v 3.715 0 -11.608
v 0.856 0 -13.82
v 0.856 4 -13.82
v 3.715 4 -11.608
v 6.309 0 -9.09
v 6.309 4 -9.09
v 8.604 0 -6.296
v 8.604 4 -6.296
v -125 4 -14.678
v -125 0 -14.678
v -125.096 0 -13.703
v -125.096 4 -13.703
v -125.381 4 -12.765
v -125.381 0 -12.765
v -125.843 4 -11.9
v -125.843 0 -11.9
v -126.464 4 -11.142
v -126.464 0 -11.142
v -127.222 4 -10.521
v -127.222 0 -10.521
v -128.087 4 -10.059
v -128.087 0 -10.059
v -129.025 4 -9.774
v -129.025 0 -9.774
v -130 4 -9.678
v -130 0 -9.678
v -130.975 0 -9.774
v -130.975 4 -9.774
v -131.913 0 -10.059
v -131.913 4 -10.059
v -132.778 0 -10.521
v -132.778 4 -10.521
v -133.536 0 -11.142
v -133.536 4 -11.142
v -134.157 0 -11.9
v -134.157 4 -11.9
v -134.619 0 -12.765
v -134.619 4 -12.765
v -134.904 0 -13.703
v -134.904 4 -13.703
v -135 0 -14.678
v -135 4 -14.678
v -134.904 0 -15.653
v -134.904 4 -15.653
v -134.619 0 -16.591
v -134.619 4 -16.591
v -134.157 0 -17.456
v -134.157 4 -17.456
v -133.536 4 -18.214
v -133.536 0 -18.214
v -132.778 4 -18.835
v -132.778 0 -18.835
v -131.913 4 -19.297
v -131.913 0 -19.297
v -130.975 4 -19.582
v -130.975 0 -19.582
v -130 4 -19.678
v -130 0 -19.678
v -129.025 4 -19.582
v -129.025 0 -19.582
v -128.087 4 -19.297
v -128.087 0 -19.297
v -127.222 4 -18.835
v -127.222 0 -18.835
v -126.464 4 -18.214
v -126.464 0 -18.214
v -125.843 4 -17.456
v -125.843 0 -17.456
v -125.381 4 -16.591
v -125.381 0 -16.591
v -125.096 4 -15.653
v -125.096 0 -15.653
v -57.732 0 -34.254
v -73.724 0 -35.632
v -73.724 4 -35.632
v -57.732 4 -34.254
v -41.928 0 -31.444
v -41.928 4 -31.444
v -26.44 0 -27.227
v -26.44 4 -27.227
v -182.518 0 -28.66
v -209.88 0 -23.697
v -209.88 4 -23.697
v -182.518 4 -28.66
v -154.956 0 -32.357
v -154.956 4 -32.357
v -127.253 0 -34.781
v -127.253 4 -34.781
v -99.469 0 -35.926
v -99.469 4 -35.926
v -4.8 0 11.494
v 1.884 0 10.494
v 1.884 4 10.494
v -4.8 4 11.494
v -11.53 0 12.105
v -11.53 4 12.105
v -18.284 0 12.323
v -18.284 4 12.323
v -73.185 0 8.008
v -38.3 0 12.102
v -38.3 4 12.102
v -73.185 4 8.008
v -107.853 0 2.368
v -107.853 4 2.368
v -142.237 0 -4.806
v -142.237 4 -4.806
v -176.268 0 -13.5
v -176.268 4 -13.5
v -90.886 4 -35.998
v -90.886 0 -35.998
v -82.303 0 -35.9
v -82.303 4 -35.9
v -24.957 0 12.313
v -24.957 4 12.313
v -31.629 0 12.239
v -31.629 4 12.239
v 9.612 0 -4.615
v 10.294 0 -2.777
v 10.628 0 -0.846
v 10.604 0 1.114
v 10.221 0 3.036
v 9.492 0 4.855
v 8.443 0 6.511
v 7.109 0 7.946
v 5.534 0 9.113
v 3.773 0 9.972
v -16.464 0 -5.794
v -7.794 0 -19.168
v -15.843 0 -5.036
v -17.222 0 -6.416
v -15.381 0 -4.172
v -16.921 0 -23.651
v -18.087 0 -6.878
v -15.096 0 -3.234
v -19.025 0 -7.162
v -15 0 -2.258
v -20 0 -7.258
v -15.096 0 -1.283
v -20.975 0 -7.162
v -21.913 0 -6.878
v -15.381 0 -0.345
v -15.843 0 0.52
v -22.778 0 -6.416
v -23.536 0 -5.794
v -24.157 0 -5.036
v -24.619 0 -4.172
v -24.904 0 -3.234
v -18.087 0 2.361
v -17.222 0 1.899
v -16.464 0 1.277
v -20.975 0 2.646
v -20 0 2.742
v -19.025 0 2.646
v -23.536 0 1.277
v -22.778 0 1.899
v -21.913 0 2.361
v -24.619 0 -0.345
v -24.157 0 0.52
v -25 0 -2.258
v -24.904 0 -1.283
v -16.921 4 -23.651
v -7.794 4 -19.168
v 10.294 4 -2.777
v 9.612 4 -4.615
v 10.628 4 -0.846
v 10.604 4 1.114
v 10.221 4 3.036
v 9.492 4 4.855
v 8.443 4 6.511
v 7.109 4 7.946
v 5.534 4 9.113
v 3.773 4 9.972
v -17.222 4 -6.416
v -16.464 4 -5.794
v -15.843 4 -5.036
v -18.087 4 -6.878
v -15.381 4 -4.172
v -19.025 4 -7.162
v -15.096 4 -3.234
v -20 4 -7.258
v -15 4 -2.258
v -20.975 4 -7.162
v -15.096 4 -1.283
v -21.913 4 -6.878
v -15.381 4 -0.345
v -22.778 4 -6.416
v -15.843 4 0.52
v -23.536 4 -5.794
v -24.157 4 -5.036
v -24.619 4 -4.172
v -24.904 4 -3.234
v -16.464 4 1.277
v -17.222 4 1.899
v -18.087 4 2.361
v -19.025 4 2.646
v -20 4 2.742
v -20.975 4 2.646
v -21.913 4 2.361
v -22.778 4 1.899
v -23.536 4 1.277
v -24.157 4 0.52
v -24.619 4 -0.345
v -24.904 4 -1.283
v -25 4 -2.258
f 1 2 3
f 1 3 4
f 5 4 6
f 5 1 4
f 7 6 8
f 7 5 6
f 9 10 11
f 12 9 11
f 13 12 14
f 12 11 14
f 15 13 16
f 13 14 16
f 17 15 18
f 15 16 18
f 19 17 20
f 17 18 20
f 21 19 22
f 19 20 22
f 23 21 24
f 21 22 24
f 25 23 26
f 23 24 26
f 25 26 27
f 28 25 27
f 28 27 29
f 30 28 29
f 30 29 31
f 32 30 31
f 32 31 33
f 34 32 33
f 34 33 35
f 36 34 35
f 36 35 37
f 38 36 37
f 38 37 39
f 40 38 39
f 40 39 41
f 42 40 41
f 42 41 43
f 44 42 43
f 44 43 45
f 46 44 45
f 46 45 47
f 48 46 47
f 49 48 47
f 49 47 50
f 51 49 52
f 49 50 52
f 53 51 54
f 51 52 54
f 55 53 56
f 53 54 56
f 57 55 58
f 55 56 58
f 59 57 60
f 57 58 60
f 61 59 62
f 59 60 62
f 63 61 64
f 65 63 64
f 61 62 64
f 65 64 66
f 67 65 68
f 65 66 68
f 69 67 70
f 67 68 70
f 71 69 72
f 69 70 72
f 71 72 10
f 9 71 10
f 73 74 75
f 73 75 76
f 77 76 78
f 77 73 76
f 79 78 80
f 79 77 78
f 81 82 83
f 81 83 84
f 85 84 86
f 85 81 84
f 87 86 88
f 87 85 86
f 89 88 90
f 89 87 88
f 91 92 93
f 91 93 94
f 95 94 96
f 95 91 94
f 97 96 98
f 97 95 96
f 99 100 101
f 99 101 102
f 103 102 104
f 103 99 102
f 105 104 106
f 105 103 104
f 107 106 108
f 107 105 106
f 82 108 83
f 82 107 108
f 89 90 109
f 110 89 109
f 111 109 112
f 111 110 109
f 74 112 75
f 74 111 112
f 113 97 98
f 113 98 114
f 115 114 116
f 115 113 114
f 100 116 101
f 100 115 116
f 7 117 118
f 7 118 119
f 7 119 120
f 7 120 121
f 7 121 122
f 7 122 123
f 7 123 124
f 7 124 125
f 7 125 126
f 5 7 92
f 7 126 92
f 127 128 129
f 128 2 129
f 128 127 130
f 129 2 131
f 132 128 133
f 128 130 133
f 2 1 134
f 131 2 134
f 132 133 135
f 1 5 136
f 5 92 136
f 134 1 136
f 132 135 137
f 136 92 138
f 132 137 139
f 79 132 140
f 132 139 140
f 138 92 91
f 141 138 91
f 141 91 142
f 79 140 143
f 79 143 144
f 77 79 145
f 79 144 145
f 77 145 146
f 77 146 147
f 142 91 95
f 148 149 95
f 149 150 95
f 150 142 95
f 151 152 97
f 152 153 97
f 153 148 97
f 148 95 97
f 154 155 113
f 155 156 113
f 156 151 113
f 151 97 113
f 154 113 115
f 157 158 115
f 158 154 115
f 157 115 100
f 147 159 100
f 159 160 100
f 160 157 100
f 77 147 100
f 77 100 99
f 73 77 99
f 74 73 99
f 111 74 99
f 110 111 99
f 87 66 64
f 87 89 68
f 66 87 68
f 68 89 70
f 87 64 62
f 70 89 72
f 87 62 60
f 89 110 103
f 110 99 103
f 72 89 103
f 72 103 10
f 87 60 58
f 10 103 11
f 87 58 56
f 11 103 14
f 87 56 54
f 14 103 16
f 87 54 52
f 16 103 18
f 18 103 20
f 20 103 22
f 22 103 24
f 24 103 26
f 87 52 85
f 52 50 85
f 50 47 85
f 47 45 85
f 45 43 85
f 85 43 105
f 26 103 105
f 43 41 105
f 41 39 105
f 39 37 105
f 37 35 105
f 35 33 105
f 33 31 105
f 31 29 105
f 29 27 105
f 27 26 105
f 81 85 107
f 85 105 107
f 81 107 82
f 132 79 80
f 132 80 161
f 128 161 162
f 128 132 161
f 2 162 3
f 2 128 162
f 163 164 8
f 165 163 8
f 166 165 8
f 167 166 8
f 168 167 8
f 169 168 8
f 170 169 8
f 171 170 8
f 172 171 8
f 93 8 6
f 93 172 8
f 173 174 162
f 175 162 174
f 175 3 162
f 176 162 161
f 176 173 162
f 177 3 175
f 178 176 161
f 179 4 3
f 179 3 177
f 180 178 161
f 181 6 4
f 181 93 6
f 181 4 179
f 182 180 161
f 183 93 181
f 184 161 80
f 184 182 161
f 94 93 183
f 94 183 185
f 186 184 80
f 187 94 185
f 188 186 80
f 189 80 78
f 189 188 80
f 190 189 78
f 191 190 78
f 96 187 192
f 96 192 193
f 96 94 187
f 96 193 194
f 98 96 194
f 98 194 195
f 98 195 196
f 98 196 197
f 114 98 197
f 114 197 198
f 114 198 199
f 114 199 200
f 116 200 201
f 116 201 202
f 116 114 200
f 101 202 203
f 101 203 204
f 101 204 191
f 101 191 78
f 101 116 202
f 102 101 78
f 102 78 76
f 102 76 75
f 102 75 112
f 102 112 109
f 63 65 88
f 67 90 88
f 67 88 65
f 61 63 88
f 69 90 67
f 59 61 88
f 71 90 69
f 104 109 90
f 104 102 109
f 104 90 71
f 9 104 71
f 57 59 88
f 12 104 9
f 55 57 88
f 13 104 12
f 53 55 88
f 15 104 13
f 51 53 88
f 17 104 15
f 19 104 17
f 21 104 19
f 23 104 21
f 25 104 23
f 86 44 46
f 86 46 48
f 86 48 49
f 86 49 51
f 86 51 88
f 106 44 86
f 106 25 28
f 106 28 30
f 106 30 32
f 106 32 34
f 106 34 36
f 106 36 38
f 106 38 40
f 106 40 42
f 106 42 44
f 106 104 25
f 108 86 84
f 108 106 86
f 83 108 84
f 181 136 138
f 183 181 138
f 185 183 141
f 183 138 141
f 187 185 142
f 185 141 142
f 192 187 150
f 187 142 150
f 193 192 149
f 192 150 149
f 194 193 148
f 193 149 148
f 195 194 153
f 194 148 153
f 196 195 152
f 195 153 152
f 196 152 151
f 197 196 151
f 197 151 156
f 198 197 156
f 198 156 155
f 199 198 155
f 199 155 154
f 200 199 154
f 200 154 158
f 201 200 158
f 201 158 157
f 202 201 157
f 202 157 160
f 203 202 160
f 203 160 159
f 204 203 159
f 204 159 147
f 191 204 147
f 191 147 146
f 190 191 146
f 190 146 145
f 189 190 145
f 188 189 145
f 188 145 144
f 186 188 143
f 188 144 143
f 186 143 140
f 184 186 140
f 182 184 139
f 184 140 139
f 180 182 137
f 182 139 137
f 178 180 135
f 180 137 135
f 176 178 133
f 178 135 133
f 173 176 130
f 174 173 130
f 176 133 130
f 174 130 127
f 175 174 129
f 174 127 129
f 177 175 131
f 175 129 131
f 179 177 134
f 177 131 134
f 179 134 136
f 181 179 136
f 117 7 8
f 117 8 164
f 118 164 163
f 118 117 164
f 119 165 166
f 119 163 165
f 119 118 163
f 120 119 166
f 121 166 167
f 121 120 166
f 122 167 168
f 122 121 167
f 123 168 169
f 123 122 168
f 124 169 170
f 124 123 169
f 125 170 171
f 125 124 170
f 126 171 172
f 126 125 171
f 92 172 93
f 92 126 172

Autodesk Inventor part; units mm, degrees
ref_plane "YZ Plane" through (0, 0, 0) normal (1, 0, 0) x (0, 1, 0)
ref_plane "XZ Plane" through (0, 0, 0) normal (0, 1, 0) x (-1, 0, 0)
ref_plane "XY Plane" through (0, 0, 0) normal (0, 0, 1) x (1, 0, 0)
sketch "スケッチ1" plane through (0, 0, 0) normal (0, 1, 0) x (-1, 0, 0)
  arc A0 (209.8798, -23.6971) -> (38.3003, 12.1023) centre (-36.3979, -774.9853) ccw projected
  arc A1 (99.4686, -35.9265) -> (209.8798, -23.6971) centre (88.5018, 567.6156) ccw projected
  arc A2 (73.7238, -35.6322) -> (99.4686, -35.9265) centre (91.566, 398.982) ccw projected
  arc A3 (26.4399, -27.2272) -> (73.7238, -35.6322) centre (81.048, 142.776) ccw projected
  arc A4 (-0.8557, -13.8205) -> (26.4399, -27.2272) centre (58.458, 72.45) ccw projected
  arc A5 (-8.6045, -6.2961) -> (-0.8557, -13.8205) centre (17.4, 12.732) ccw projected
  arc A6 (-1.8835, 10.4943) -> (-8.6045, -6.2961) centre (0, 0) ccw projected
  arc A7 (18.284, 12.3227) -> (-1.8835, 10.4943) centre (18.66, -103.968) ccw projected
  arc A8 (38.3003, 12.1023) -> (18.284, 12.3227) centre (20.556, -690.396) ccw projected
extrude "押し出し1" add sketch "スケッチ1" along normal blind 4
sketch "スケッチ2" plane through (0, 0, 0) normal (0, -1, 0) x (1, 0, 0)
  circle A0 centre (-20, -2.2582) radius 5
  circle A1 centre (-130, -14.678) radius 5
  line L0 (0, 0) -> (-209.8798, -23.6971)
  dimension "d3" = 10
  dimension "d4" = 10
  dimension "d5" = 20
  dimension "d6" = 130
extrude "押し出し2" cut sketch "スケッチ2" against normal through all
equation "\"d4\" = d3"
properties part number "plate" material "木材 (オーク)"
